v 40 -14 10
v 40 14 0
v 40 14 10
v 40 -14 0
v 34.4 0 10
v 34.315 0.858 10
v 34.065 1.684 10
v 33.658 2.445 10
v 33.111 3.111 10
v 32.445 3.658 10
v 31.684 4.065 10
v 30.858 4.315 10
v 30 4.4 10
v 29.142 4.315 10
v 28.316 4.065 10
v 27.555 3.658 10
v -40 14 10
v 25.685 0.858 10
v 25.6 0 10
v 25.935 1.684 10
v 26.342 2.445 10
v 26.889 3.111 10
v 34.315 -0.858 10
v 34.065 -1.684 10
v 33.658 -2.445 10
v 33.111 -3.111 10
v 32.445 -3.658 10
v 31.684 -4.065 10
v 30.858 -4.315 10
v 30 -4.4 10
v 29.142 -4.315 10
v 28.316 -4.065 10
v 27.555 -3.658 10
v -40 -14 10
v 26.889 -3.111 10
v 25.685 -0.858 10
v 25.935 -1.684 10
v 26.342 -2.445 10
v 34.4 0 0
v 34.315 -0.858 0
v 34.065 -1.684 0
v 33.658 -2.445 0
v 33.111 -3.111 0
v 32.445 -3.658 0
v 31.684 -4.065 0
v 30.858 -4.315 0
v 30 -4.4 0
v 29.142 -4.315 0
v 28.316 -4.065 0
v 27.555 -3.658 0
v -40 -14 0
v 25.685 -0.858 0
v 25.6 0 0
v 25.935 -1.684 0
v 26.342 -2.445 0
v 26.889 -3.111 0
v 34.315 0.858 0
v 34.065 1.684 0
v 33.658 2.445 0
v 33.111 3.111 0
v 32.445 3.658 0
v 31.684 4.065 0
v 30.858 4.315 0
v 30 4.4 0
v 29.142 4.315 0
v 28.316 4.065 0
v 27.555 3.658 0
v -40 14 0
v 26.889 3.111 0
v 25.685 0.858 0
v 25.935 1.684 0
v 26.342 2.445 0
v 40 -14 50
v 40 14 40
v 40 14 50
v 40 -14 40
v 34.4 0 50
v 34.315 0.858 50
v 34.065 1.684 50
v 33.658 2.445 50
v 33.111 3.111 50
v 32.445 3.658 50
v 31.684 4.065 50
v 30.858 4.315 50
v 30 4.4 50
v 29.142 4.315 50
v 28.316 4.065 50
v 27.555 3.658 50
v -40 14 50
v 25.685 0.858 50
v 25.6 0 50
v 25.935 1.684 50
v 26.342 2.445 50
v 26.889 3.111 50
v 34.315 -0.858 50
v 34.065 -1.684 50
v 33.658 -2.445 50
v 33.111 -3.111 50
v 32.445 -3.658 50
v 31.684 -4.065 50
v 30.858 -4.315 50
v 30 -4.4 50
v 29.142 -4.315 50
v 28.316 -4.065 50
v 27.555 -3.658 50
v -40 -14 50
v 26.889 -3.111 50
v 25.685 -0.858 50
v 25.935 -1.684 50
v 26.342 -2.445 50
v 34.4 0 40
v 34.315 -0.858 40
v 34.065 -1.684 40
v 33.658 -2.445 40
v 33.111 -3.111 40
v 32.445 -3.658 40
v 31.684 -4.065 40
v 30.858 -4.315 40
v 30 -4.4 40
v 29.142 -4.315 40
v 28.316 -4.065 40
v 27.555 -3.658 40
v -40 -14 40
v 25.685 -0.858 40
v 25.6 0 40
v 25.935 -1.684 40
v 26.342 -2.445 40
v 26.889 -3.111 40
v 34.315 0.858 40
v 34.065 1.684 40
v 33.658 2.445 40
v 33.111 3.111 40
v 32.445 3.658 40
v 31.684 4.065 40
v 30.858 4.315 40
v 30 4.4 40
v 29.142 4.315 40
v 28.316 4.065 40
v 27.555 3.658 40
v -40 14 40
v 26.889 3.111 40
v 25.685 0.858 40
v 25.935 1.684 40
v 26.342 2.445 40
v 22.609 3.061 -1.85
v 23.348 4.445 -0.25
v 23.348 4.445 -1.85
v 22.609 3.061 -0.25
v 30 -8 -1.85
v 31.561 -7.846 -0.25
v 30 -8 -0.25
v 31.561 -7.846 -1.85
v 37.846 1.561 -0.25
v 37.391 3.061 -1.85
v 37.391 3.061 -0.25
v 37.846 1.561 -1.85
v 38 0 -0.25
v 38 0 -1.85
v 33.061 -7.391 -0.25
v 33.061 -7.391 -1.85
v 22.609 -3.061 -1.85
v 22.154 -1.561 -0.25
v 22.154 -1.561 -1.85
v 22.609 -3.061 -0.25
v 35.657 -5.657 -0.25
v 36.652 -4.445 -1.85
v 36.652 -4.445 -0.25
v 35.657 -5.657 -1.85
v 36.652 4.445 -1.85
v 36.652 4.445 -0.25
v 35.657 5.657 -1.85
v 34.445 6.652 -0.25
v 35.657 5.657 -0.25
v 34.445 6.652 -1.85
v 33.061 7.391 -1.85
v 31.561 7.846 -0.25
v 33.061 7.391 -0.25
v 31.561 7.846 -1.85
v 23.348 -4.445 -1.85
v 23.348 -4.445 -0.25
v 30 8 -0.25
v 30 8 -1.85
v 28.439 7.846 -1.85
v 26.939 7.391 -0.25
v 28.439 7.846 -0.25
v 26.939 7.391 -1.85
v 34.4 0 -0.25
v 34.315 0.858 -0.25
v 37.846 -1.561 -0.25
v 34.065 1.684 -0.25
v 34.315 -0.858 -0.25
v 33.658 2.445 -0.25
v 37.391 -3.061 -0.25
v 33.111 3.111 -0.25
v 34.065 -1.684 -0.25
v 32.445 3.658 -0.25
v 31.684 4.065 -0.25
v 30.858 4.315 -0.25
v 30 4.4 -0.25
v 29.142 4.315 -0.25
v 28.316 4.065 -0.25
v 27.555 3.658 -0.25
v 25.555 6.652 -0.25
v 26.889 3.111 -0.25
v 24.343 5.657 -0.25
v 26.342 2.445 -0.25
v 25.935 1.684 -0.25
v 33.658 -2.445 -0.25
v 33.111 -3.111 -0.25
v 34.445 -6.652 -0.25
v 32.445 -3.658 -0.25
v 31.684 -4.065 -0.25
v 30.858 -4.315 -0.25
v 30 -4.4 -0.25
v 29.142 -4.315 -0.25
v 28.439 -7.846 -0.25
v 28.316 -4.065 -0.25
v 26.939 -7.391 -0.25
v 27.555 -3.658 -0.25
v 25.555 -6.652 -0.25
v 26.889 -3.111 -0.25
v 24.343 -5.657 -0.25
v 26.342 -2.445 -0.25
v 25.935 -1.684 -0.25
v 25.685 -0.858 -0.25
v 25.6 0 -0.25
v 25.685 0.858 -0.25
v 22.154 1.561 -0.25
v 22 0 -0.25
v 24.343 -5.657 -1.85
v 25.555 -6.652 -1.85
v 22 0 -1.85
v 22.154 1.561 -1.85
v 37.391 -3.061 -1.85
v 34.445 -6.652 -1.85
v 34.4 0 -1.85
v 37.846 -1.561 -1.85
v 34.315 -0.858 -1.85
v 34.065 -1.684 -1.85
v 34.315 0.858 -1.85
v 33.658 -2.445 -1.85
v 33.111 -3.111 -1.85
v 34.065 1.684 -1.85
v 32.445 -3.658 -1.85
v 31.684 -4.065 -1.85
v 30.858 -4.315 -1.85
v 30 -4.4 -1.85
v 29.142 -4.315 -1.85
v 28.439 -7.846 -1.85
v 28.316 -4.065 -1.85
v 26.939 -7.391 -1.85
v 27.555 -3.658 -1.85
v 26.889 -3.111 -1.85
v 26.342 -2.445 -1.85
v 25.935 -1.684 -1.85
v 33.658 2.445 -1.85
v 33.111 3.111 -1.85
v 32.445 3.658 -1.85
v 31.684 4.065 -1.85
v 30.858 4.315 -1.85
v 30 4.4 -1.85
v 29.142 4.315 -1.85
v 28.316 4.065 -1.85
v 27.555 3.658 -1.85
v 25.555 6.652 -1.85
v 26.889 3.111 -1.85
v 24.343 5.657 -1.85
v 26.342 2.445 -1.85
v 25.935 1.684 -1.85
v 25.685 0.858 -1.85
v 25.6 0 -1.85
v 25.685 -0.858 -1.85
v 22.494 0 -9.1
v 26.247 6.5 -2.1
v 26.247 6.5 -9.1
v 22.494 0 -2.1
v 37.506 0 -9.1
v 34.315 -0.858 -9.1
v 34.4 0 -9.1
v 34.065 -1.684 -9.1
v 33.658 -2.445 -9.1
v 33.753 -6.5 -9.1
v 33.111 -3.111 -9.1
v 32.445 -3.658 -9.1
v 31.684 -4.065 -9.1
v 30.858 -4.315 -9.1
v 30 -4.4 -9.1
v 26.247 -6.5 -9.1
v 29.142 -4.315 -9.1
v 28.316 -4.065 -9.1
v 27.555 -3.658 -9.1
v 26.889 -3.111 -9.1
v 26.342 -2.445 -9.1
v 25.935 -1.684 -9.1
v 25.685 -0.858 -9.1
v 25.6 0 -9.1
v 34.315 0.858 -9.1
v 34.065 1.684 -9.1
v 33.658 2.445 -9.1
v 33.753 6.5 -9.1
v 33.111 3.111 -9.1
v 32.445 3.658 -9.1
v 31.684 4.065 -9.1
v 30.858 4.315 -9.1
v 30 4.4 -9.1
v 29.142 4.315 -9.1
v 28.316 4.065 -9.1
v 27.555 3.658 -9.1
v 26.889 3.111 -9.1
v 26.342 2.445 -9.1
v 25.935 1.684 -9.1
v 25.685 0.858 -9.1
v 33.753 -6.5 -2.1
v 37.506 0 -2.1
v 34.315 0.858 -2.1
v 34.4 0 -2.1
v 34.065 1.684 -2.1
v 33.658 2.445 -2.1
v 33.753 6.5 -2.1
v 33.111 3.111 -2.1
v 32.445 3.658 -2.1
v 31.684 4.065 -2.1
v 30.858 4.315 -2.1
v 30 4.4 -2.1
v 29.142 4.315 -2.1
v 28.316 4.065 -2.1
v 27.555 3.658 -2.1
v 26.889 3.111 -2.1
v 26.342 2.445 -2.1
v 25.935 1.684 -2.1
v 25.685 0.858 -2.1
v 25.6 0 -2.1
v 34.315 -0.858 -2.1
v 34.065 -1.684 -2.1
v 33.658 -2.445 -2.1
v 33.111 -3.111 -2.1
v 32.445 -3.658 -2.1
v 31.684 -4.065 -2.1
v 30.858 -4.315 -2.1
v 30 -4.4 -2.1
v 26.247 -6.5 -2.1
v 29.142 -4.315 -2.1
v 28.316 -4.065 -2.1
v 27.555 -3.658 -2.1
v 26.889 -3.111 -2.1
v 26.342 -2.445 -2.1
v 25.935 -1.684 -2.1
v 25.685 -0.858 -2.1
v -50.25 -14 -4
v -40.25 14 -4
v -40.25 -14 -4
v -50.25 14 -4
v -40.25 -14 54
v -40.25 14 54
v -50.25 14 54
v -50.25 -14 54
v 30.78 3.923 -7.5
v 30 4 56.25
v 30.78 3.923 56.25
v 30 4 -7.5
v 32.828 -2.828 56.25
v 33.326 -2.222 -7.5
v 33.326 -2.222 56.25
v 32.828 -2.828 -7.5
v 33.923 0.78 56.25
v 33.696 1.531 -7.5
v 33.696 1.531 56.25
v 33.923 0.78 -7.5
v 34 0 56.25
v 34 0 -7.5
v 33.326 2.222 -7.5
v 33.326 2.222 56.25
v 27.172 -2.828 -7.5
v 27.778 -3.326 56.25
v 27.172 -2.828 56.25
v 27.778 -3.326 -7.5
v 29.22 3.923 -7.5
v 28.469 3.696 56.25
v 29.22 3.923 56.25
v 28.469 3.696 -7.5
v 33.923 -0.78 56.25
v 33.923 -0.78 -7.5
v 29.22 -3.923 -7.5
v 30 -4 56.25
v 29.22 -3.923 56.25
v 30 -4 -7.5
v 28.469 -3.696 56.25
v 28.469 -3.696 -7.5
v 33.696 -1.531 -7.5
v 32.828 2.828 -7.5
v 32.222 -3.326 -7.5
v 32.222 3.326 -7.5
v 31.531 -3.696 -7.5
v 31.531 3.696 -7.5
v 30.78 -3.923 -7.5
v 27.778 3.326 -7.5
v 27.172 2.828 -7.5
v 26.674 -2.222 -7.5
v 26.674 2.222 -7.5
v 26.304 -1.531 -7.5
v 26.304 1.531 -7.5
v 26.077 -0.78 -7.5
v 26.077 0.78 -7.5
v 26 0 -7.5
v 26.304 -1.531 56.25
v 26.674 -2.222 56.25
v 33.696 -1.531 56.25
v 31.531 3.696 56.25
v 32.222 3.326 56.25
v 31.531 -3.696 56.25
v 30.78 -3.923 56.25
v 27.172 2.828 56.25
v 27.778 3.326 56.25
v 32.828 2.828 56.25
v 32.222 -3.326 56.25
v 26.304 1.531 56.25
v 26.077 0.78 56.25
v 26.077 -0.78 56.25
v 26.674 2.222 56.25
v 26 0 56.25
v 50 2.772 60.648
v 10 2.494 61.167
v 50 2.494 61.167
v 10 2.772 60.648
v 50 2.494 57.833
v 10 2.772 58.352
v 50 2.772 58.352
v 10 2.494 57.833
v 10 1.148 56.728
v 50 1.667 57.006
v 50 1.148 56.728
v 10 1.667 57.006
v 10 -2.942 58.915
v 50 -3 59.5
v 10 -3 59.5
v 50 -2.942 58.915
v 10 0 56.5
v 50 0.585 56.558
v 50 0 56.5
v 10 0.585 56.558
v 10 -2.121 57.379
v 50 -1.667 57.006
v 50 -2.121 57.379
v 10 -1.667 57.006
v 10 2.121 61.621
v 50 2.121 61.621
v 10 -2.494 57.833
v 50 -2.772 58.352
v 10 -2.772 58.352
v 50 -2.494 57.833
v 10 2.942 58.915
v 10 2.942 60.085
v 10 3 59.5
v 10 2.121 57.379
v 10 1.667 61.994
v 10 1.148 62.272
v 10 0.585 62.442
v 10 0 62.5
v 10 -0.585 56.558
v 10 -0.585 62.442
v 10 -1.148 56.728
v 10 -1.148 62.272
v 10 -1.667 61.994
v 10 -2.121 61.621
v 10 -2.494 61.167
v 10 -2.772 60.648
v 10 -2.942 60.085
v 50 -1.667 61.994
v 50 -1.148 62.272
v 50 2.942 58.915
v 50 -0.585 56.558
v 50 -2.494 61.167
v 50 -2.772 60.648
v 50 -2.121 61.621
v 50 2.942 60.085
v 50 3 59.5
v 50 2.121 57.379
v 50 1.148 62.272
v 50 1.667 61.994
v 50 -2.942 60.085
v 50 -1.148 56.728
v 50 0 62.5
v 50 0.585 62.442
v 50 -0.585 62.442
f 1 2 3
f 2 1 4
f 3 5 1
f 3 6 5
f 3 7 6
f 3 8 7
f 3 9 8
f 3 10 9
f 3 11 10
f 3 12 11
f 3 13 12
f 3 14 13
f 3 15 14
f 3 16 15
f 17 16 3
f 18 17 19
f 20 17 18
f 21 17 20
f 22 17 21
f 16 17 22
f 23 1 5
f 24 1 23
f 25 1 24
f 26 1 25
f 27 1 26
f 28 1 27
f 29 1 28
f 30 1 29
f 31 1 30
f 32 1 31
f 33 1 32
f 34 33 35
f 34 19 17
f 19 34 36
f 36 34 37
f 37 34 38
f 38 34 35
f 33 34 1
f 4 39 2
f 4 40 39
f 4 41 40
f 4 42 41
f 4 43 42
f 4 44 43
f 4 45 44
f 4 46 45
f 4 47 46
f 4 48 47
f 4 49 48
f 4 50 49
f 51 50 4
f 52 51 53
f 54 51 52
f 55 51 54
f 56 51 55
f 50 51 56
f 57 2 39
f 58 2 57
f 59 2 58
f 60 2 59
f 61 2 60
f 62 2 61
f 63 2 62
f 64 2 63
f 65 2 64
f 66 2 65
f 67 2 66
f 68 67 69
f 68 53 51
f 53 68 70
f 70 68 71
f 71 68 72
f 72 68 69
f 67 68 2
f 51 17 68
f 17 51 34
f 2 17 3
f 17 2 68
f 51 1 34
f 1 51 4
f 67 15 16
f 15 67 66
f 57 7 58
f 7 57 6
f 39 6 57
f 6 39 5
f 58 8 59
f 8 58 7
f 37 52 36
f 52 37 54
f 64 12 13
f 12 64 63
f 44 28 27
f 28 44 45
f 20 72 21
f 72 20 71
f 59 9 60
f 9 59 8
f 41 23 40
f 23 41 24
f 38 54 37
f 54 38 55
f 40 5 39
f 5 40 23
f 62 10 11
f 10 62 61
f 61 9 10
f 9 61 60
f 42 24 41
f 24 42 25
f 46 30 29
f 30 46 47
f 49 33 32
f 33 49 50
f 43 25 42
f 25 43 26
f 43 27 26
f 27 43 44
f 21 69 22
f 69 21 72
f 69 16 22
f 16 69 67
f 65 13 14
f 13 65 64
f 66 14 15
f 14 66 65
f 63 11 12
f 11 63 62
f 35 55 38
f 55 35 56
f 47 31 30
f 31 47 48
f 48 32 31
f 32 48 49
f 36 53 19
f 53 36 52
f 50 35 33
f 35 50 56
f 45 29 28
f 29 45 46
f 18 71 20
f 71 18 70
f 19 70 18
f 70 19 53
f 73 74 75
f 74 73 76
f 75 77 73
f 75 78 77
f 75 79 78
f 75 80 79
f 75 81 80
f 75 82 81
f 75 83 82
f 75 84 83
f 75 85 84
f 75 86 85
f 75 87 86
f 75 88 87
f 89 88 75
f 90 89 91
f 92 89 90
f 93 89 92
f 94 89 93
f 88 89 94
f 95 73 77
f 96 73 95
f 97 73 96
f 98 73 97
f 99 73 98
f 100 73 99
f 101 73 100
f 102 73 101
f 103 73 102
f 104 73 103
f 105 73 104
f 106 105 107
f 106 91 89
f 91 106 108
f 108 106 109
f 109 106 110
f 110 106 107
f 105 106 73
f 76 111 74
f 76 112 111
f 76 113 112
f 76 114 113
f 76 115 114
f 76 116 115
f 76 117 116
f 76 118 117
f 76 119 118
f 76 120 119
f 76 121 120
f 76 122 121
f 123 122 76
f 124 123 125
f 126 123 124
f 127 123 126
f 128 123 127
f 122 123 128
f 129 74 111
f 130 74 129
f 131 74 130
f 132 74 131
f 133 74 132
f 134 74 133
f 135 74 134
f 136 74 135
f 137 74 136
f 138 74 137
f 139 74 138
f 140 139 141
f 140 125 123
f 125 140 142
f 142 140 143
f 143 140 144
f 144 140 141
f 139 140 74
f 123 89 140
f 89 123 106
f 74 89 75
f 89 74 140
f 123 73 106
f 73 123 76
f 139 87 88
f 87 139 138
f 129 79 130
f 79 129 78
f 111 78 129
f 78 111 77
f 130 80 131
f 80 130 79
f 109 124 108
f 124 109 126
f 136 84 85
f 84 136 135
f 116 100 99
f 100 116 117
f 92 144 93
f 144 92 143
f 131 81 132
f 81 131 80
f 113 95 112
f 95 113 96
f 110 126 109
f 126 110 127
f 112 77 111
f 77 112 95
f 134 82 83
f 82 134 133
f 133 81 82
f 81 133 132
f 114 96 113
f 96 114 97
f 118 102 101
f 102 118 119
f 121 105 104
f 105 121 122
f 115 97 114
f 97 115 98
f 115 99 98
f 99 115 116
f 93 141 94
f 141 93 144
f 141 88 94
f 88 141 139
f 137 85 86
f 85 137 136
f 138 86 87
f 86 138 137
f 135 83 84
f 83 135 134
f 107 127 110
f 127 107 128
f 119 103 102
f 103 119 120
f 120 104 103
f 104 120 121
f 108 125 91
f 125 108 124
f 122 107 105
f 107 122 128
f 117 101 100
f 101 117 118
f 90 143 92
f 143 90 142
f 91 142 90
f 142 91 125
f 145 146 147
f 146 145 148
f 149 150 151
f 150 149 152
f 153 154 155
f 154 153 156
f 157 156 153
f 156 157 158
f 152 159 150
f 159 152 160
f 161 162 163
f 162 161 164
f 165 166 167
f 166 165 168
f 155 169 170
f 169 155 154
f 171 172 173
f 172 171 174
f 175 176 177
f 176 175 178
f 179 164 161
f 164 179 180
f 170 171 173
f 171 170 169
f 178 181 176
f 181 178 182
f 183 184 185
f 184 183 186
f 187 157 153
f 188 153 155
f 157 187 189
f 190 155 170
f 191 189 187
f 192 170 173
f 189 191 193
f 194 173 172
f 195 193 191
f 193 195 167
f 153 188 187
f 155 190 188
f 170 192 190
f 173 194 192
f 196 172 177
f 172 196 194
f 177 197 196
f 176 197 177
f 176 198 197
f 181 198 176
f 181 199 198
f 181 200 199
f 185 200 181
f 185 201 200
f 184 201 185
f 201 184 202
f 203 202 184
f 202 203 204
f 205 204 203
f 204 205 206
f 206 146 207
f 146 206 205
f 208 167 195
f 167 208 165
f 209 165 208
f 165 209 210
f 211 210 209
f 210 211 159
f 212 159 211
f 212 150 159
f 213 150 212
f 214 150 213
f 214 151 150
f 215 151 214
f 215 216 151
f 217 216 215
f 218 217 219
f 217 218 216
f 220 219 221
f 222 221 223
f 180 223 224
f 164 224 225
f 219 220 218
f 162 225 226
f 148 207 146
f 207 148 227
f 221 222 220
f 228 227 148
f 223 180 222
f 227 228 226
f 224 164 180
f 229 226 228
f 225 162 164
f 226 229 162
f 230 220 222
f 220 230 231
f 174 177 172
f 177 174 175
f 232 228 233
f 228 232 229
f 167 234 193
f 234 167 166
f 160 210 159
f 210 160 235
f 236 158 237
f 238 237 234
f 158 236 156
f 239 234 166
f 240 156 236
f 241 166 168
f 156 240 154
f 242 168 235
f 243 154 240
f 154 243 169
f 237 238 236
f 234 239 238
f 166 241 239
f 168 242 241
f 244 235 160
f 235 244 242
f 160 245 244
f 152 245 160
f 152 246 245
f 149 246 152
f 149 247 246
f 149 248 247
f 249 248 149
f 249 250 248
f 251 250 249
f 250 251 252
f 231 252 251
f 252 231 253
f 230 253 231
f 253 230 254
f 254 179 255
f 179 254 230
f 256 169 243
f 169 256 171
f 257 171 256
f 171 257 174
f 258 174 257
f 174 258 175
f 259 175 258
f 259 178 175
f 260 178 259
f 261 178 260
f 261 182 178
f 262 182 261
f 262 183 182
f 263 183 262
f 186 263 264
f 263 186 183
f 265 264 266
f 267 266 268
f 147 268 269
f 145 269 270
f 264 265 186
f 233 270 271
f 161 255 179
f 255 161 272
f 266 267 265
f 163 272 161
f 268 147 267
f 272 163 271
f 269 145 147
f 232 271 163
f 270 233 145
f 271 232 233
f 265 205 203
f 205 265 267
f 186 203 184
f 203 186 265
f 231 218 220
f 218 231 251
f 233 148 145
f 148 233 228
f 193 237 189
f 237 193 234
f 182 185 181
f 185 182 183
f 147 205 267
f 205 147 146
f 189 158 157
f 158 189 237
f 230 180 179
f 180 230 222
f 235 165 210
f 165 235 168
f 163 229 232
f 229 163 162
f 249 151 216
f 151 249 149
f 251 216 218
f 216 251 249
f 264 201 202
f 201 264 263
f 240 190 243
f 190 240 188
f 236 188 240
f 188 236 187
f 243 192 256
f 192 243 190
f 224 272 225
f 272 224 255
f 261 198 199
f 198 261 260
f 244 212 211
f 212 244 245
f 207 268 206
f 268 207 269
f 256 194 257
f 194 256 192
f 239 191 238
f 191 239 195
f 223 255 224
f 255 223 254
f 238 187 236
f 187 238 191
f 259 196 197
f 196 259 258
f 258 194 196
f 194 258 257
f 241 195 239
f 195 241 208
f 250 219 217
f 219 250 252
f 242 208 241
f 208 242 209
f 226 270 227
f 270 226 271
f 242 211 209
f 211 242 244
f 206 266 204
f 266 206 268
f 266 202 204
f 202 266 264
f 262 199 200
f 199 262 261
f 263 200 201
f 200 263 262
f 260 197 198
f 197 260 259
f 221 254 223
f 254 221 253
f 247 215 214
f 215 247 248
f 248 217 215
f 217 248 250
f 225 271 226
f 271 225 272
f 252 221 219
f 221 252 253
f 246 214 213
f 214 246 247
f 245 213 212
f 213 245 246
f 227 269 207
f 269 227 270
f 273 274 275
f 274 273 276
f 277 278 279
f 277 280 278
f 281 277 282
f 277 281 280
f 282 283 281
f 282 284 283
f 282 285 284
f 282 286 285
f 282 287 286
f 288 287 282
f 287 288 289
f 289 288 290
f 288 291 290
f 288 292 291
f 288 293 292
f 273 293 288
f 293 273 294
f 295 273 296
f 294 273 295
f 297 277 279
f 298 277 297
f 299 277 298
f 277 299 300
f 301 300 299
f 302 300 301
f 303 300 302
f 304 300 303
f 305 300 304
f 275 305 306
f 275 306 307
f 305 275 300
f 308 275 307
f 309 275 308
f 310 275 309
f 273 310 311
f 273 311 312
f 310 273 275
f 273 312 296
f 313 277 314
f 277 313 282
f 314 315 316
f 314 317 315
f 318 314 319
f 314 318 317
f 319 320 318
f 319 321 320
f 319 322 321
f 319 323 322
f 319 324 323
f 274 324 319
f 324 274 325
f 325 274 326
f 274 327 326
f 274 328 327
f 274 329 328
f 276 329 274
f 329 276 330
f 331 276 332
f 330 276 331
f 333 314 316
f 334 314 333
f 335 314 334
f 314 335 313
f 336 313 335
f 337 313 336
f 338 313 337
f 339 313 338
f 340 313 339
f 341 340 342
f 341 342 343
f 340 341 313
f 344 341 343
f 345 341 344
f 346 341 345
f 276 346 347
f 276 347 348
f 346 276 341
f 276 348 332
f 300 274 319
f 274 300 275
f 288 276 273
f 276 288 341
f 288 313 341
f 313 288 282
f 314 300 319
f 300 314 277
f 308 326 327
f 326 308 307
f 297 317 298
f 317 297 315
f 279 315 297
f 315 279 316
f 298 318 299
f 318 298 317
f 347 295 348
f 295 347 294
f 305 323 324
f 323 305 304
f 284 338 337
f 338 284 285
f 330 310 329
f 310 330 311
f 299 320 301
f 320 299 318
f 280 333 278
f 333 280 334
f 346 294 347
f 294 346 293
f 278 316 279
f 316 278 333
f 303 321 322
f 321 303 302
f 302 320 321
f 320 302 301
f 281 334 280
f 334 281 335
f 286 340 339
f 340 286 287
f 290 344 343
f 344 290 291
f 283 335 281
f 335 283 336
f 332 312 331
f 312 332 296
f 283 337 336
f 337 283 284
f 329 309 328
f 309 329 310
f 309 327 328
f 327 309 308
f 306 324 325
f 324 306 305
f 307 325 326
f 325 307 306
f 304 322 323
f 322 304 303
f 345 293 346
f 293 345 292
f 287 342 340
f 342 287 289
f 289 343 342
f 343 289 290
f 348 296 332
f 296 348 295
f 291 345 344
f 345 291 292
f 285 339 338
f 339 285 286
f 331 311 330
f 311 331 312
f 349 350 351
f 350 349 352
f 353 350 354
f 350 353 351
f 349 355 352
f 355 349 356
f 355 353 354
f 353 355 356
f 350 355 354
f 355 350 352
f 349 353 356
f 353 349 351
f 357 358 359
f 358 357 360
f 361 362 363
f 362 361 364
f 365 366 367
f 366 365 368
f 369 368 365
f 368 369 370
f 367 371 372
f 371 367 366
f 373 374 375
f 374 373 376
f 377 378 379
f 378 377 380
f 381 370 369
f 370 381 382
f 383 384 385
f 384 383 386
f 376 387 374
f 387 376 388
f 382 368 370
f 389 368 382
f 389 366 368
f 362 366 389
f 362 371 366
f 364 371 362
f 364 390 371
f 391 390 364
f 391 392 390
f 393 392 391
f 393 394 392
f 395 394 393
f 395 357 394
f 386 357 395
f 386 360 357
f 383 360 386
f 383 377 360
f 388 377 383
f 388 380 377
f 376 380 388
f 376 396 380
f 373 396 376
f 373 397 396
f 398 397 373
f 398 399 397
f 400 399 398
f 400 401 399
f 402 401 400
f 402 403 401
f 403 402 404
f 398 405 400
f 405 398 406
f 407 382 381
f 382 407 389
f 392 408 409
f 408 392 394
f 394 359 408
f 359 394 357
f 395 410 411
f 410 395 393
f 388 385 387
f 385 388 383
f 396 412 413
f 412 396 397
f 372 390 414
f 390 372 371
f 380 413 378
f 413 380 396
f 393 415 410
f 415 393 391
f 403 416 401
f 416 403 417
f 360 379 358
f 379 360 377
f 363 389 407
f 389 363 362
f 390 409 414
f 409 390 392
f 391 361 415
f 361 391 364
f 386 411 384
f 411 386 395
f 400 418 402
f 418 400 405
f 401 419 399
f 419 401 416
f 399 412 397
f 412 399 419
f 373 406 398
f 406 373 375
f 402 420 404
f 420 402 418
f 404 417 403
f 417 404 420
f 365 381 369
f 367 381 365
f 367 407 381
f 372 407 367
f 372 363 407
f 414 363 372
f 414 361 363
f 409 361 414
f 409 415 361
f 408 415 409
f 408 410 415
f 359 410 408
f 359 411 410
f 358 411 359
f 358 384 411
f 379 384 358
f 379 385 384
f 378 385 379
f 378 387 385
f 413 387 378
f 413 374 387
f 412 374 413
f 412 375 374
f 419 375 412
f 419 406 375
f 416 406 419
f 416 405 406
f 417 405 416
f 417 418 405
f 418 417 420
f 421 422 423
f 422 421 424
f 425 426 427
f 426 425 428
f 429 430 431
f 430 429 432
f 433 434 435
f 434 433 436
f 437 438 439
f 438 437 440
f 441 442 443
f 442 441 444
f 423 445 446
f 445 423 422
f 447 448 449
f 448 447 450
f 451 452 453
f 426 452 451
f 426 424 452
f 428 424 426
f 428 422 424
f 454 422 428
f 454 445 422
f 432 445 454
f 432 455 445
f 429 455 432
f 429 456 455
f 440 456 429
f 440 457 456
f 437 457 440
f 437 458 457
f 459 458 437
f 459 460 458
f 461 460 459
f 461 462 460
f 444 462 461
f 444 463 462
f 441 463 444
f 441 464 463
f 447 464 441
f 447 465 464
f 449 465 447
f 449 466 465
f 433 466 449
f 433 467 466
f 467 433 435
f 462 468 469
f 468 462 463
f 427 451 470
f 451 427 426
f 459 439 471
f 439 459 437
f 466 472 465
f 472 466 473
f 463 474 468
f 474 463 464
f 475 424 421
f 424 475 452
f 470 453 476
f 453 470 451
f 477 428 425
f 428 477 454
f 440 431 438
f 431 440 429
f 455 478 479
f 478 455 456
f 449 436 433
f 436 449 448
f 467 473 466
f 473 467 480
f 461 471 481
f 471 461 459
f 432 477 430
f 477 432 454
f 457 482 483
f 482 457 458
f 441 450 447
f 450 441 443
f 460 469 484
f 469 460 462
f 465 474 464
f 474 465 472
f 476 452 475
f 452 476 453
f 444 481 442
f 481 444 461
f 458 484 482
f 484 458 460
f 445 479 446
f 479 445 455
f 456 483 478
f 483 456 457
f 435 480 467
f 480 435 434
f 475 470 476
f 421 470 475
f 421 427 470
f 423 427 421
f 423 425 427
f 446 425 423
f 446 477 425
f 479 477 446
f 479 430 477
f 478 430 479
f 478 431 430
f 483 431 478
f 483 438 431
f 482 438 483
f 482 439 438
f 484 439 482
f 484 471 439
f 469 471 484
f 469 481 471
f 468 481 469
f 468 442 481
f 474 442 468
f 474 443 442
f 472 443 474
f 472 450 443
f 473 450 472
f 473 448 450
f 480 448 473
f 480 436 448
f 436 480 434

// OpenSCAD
$fn = 32;

// ------------------------------------------------------------------------
// C clamp: throat 40 mm, screw d8
// Every part is its own module, assembly() places every instance.
// ------------------------------------------------------------------------

// --- part 1 ---
module clamp_arm() {
  difference() {
    translate([-40, -14, 0]) cube([80, 28, 10]);
    translate([30, 0, -1]) cylinder(h = 12, d = 8.8);
  }
}

// --- part 2 ---
module clamp_spine() {
  difference() {
    translate([-29, -14, 0]) cube([58, 28, 10]);
  }
}

// --- part 3 ---
module clamp_screw() {
  translate([0, 0, -31.875]) cylinder(h = 63.75, d = 8);
}

// --- part 4 ---
module clamp_washer() {
  difference() {
      translate([0, 0, 0]) cylinder(h = 1.6, d = 16);
      translate([0, 0, -1]) cylinder(h = 3.6, d = 8.8);
    }
}

// --- part 5 ---
module clamp_nut() {
  difference() {
    linear_extrude(height = 7) polygon(points = [[7.506, 0], [3.753, 6.5], [-3.753, 6.5], [-7.506, 0], [-3.753, -6.5], [3.753, -6.5]]);
    translate([0, 0, -1]) cylinder(h = 9, d = 8.8);
  }
}

// --- part 6 ---
module tommy_bar() {
  translate([0, 0, -20]) cylinder(h = 40, d = 6);
}

// --- assembly ---
module assembly() {
  color([0.80, 0.24, 0.20]) translate([0, 0, 0]) rotate([0, 0, 0]) clamp_arm();
  color([0.20, 0.45, 0.75]) translate([0, 0, 40]) rotate([0, 0, 0]) clamp_arm();
  color([0.25, 0.62, 0.32]) translate([-50.25, 0, 25]) rotate([0, 90, 0]) clamp_spine();
  color([0.92, 0.70, 0.18]) translate([30, 0, 24.375]) rotate([0, 0, 0]) clamp_screw();
  color([0.58, 0.35, 0.70]) translate([30, 0, -1.85]) rotate([0, 0, 0]) clamp_washer();
  color([0.16, 0.66, 0.66]) translate([30, 0, -9.1]) rotate([0, 0, 0]) clamp_nut();
  color([0.85, 0.48, 0.18]) translate([30, 0, 59.5]) rotate([0, 90, 0]) tommy_bar();
}

assembly();
